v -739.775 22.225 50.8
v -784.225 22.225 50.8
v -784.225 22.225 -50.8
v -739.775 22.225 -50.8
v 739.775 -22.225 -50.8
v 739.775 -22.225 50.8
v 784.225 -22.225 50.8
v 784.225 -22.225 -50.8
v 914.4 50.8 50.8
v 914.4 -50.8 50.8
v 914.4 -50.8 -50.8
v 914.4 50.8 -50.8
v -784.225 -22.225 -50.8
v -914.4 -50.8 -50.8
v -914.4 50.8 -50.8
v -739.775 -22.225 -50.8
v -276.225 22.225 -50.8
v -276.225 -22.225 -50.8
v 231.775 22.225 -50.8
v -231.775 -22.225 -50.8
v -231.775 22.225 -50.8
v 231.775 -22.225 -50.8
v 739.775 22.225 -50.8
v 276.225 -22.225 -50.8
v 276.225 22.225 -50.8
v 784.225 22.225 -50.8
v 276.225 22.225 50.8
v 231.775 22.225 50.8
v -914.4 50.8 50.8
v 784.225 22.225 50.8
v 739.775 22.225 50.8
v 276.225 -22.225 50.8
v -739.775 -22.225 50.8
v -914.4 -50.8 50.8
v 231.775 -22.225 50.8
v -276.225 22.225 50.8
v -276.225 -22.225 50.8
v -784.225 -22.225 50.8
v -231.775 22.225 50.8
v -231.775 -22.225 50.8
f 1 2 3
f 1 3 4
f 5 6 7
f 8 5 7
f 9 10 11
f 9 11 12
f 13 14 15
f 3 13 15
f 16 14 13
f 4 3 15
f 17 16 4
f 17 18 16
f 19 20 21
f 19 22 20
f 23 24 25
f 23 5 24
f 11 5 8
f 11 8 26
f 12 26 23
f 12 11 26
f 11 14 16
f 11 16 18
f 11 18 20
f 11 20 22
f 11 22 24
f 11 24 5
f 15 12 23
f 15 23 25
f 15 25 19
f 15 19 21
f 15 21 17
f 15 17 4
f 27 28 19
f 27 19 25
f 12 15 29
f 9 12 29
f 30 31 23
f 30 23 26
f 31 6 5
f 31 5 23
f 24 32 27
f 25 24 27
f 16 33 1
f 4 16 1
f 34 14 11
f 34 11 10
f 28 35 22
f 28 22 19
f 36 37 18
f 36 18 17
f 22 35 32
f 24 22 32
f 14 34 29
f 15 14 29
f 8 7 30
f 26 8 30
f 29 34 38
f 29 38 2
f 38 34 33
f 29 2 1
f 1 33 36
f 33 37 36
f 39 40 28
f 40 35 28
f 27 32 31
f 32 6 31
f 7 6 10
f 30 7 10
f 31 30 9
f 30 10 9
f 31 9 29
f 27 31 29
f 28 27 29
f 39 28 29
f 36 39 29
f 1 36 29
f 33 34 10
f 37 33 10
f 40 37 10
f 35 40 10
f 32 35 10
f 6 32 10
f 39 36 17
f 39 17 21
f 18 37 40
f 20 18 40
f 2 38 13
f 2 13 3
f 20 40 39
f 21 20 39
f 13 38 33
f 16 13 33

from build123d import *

# Parameters (mm, degrees)
F0_W            = 101.6
F0_H            = 101.6
F1_DEPTH        = 914.4
F2_W            = 44.45
F2_H            = 44.45
F3_DEPTH        = 101.601
F4_W            = 44.45
F4_H            = 44.45
F5_DEPTH        = 101.601
F5_COPIES_COUNT = 3
F5_COPIES_PITCH = 508


# Not quite as in the source:
# - a pattern or mirror of a feature is missing from the dataset's text; its kind, count and spacing are read off the source's solid


with BuildPart() as f1:
    # F0 (on Right) → F1 (new body, symmetric)
    with BuildSketch(Plane.YZ):
        Rectangle(F0_W, F0_H)
    extrude(amount=F1_DEPTH, both=True)

    # F2 (on face) → F3 (cut, through all)
    with BuildSketch(Plane.XY.offset(50.8)):
        with Locations((-762, 0)):
            Rectangle(F2_W, F2_H)
    extrude(amount=-F3_DEPTH, mode=Mode.SUBTRACT)

    # F4 (on face) → F5 (cut, through all)
    with BuildSketch(Plane.XY.offset(50.8)):
        with Locations((-254, 0)):
            Rectangle(F4_W, F4_H)
    f5 = extrude(amount=-F5_DEPTH, mode=Mode.SUBTRACT)

    # F5_copies: F5 ×3
    with Locations(*[(i * F5_COPIES_PITCH, 0, 0) for i in range(1, F5_COPIES_COUNT)]):
        add(f5, mode=Mode.SUBTRACT)


solid = f1.part
